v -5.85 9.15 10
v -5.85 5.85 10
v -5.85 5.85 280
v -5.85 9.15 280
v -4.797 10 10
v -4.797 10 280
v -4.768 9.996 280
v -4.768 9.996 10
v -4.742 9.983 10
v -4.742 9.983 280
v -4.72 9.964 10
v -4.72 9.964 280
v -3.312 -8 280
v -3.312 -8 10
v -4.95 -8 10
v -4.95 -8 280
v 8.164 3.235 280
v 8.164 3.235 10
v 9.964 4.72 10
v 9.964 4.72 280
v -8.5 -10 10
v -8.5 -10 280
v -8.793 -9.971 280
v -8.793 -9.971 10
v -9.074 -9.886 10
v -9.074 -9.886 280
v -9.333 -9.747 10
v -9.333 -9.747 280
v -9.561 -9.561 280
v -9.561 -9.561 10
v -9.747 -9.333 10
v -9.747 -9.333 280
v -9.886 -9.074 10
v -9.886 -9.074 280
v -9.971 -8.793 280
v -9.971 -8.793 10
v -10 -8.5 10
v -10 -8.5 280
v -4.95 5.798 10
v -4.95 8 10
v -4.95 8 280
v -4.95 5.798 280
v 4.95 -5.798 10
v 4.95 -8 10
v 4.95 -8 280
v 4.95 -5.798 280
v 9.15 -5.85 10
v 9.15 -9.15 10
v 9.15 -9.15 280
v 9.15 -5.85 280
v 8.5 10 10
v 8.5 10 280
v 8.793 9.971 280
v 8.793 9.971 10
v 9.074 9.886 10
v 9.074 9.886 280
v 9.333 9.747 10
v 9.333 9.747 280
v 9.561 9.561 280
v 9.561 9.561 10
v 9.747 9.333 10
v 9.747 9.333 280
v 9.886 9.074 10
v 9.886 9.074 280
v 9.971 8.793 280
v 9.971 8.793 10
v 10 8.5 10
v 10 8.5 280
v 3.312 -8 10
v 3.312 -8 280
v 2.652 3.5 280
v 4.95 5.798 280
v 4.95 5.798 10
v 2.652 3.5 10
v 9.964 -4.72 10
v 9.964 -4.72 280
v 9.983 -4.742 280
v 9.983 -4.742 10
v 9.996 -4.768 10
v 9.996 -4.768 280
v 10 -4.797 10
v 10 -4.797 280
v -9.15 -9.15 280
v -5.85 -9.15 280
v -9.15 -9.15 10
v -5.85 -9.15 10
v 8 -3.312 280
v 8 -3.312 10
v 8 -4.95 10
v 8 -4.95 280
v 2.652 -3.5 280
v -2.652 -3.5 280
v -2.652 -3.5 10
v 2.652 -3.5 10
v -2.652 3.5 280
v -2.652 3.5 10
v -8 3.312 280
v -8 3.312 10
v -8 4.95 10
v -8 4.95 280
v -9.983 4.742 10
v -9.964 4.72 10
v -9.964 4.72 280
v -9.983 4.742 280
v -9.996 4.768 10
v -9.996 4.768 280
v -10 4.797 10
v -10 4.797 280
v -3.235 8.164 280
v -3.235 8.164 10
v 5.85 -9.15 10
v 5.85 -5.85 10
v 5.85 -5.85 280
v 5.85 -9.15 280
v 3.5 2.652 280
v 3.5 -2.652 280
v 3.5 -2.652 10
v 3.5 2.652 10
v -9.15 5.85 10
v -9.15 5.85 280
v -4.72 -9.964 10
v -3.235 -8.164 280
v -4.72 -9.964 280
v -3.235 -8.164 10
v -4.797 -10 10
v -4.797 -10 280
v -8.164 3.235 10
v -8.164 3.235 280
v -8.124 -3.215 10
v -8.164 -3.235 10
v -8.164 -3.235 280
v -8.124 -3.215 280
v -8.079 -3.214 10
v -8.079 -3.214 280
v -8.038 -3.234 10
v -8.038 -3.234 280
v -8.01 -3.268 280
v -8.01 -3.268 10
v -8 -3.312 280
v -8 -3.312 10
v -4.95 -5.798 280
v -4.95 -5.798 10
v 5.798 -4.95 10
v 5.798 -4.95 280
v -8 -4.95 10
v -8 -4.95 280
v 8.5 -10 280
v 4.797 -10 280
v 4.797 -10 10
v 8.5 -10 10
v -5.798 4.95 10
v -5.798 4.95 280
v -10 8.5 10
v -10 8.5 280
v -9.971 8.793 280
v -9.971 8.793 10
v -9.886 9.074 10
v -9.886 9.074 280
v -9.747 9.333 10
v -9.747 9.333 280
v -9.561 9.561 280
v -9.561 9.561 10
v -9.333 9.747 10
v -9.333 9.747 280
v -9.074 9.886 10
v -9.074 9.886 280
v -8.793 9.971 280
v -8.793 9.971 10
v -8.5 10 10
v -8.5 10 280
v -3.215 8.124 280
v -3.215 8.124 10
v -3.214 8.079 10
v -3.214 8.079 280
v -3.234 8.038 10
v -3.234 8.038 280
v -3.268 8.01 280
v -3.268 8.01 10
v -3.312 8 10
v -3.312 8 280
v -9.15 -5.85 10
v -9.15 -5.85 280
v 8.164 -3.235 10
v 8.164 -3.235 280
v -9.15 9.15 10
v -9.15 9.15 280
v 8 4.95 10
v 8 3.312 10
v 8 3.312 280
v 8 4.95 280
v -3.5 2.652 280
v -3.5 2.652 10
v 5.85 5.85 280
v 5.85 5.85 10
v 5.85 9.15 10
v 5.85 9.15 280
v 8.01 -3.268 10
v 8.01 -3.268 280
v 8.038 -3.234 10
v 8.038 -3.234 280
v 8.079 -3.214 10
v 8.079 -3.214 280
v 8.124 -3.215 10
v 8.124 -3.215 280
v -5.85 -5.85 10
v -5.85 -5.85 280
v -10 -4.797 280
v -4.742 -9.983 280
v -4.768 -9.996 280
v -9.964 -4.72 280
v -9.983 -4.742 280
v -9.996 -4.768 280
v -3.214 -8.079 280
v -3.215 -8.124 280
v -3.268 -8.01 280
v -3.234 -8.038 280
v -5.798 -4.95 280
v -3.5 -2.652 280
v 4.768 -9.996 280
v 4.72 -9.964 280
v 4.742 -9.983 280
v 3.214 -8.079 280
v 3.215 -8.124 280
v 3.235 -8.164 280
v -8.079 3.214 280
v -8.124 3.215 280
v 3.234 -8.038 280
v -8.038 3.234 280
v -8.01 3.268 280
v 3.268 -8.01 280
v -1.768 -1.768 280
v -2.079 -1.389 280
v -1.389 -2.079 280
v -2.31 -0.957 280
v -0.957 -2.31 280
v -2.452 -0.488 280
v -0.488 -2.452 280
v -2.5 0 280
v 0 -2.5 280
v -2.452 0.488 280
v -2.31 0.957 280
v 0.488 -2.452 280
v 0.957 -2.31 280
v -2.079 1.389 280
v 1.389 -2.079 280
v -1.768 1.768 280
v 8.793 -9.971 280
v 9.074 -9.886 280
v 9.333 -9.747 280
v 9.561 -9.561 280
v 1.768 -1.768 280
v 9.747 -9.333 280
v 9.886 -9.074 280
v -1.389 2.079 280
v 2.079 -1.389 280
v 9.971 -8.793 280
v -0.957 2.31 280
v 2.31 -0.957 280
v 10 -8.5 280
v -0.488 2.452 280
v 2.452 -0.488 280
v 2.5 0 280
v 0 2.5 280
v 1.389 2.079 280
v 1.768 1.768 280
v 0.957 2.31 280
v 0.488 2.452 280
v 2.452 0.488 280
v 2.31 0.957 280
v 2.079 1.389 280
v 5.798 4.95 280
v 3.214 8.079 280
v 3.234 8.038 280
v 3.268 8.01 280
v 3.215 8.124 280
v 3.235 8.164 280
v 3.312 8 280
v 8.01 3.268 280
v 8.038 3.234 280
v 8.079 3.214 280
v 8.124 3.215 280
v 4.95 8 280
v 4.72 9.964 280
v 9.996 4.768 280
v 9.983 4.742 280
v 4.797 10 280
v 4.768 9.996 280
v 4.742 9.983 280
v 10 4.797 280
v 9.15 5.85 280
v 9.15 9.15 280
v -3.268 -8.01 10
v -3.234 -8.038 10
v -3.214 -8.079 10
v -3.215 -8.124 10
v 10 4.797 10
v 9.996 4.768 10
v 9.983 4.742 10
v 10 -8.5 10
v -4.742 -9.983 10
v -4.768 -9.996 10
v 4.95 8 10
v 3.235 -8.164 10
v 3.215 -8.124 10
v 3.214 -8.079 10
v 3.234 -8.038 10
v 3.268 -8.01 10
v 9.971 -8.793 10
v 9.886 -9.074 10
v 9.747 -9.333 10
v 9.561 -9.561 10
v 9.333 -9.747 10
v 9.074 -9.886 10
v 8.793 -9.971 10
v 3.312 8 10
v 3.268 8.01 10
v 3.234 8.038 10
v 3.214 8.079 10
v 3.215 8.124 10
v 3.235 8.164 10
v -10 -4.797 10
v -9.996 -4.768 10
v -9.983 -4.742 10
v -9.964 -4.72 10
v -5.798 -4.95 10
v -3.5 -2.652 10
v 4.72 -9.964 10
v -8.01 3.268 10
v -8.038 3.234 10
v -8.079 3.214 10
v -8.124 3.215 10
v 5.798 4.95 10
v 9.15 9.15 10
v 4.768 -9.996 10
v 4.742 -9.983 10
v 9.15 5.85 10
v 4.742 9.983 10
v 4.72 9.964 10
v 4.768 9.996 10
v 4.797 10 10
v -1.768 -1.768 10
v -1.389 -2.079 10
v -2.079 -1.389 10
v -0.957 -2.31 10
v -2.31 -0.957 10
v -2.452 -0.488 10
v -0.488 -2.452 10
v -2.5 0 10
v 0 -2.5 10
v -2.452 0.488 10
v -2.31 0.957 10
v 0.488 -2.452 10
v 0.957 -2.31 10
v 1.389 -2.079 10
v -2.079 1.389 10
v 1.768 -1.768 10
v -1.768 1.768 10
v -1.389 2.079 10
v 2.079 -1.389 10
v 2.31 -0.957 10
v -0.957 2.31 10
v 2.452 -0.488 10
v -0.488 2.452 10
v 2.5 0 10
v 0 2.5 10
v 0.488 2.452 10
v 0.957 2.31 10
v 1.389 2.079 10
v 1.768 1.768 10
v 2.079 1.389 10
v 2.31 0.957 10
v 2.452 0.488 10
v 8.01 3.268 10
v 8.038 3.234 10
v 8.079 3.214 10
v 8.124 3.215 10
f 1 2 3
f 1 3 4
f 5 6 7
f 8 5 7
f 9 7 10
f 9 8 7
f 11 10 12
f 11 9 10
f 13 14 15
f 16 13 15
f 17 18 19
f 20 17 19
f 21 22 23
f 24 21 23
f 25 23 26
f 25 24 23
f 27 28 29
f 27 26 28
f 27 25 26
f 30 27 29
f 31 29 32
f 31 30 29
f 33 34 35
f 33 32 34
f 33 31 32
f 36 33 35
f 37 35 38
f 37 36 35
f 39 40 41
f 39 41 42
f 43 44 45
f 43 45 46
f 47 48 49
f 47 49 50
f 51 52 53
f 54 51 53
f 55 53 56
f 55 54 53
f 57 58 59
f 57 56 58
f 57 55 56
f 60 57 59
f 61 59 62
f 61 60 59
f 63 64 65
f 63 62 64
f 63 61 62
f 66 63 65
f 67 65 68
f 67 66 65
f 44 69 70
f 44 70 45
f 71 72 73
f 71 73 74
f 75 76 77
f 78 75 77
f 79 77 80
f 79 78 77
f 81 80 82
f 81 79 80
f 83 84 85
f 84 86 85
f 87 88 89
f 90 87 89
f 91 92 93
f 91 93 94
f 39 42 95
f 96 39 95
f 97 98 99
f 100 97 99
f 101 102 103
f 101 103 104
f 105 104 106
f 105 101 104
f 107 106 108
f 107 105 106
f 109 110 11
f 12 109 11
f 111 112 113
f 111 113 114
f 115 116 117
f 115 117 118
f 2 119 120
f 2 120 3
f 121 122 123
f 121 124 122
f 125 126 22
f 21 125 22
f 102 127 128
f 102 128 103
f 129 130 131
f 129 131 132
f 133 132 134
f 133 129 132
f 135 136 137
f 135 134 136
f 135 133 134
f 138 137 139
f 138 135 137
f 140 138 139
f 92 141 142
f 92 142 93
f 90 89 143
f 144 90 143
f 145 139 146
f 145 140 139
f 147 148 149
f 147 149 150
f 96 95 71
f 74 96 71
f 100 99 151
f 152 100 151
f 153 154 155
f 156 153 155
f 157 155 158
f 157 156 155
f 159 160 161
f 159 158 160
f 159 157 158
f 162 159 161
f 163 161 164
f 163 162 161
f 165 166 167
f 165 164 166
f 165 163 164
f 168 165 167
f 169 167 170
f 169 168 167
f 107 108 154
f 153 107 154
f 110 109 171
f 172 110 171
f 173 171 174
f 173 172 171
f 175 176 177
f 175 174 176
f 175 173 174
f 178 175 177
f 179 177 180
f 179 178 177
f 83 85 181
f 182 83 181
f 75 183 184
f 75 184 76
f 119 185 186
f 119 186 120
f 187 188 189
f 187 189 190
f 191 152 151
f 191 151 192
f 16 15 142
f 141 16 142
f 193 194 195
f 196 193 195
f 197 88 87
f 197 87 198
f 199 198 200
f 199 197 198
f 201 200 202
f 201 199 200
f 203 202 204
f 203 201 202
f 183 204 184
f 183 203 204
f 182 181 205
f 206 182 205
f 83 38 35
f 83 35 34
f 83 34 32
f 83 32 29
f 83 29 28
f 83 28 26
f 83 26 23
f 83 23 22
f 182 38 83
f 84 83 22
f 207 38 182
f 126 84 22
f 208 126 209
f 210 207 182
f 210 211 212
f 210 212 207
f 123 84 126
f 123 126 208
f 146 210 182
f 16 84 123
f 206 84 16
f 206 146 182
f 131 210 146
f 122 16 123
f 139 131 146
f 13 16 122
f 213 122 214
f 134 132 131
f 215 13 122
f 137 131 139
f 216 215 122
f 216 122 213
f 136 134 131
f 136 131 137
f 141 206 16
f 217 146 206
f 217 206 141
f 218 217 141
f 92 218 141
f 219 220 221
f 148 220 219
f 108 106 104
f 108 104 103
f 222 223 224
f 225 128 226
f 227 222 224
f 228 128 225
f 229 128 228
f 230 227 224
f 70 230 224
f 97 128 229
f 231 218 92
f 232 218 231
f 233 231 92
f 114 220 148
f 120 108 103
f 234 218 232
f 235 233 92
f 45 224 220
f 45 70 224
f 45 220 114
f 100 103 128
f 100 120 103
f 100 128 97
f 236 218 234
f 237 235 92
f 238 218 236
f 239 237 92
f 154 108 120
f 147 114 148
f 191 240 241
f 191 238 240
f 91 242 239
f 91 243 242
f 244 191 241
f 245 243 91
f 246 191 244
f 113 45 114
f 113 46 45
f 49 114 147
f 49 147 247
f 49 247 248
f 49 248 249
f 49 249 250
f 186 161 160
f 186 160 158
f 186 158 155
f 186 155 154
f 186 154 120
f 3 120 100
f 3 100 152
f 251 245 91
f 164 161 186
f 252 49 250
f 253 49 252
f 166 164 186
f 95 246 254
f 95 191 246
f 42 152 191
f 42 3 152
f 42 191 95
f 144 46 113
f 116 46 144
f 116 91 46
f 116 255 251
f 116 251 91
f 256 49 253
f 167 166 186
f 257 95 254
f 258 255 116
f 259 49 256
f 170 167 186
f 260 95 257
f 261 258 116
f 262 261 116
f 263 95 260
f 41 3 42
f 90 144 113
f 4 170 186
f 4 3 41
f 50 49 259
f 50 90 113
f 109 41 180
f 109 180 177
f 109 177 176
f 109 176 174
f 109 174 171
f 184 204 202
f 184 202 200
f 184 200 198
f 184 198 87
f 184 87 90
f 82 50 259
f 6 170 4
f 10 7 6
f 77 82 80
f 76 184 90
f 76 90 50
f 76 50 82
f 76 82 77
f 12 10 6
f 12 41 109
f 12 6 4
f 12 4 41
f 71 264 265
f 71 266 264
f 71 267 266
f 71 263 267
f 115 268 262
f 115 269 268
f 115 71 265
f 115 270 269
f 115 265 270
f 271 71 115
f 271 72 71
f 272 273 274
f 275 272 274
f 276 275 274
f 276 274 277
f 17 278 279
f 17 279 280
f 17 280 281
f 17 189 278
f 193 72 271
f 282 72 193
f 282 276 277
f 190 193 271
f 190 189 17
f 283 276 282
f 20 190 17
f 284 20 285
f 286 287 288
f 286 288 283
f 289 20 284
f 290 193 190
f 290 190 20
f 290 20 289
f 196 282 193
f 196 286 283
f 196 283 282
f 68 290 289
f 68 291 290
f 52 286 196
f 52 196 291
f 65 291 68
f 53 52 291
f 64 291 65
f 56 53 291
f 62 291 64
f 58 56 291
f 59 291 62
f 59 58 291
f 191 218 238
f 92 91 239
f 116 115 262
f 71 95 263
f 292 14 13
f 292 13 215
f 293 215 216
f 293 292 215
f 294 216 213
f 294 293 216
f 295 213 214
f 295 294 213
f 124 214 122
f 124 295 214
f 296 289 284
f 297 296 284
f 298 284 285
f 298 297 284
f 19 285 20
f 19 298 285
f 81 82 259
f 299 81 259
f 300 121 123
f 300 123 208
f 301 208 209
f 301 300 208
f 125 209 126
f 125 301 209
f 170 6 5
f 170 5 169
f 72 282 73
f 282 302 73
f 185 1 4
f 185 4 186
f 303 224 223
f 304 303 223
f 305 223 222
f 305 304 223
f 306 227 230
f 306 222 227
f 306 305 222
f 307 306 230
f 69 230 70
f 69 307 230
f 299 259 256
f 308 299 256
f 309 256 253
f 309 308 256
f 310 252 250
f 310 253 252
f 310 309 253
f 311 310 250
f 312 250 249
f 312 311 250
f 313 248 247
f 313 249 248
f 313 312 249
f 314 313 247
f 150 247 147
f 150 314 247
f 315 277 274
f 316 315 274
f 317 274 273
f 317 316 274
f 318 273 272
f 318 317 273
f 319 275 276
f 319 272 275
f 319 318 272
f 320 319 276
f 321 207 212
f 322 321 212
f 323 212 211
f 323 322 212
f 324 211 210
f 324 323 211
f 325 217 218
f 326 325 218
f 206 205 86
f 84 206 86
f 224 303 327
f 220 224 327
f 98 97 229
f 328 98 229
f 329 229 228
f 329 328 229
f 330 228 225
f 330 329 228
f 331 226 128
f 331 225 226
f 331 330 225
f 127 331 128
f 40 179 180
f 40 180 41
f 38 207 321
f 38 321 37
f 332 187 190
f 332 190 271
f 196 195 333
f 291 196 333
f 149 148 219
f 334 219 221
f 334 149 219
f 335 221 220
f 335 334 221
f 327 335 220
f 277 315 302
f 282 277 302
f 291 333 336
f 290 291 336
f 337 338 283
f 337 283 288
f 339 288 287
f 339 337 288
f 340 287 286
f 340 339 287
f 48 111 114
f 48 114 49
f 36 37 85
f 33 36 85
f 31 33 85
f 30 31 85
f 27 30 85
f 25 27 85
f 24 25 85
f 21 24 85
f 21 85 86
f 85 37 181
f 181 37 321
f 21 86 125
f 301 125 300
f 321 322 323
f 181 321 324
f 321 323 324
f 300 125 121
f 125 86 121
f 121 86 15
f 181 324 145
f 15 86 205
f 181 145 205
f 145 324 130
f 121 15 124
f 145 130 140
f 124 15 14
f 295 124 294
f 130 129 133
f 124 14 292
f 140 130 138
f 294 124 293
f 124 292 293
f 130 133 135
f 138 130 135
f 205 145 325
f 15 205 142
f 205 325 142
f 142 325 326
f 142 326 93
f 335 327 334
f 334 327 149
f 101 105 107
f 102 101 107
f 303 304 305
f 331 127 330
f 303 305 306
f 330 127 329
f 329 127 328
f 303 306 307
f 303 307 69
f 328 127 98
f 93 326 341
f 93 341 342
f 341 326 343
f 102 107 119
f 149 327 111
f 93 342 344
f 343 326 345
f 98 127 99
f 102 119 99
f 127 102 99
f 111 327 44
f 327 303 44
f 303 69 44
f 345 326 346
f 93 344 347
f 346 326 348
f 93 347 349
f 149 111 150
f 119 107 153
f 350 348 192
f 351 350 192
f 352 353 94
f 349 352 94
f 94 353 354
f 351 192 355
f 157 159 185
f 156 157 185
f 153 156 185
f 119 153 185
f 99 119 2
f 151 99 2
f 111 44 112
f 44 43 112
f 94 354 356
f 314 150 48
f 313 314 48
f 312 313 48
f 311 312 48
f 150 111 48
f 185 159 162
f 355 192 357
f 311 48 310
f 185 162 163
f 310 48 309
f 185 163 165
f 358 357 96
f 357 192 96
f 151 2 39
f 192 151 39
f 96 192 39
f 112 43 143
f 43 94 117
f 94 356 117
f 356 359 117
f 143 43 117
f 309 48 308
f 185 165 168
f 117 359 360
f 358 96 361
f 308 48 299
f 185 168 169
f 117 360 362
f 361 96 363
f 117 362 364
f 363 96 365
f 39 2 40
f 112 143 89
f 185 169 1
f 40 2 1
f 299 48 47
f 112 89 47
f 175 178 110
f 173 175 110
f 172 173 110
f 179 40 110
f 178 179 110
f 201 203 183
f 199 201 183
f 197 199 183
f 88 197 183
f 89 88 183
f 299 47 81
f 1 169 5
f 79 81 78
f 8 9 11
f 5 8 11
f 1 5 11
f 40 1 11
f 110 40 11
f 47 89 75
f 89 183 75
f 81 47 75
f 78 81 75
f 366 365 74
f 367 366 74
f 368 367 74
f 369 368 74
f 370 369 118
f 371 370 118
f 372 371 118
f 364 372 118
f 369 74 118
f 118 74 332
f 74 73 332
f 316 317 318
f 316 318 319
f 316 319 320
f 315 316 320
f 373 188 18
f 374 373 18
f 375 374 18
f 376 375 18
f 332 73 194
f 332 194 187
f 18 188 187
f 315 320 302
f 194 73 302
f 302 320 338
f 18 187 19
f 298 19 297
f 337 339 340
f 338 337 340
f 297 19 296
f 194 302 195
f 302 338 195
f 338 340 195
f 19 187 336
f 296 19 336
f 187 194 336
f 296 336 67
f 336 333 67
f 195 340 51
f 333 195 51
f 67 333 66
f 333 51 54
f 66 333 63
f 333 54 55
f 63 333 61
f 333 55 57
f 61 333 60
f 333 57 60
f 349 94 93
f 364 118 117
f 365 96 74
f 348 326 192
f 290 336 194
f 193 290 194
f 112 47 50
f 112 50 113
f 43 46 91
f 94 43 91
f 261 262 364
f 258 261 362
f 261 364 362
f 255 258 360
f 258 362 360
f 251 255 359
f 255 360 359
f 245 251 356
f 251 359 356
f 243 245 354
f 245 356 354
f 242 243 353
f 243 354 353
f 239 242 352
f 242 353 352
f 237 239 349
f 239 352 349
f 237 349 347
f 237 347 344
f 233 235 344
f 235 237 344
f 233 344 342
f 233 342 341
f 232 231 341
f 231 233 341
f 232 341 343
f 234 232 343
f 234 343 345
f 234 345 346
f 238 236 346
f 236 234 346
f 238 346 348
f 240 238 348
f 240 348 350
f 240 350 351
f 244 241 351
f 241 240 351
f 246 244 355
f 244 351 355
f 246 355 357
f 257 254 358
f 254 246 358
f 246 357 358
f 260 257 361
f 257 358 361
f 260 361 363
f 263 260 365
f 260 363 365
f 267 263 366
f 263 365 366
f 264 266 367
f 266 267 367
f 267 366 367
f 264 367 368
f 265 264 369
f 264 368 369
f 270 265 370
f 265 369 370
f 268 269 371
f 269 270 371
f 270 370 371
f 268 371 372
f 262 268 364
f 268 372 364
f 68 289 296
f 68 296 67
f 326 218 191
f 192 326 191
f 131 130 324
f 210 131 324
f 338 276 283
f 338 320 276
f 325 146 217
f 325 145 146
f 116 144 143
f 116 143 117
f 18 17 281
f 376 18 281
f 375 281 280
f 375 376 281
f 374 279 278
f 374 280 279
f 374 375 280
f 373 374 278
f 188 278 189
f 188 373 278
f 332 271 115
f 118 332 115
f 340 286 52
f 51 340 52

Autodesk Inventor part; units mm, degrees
ref_plane "Начальная плоскость" through (0, 0, 10) normal (0, 0, 1) x (1, 0, 0)
ref_plane "Конечная плоскость" through (0, 0, 280) normal (0, 0, 1) x (1, 0, 0)
sketch "Эскиз" plane through (0, 0, 0) normal (0, 0, 1) x (1, 0, 0)
  line L0 (-14.4349, 0) -> (14.4349, 0) projected
  line L1 (0, -14) -> (0, 14) projected
  line L2 (0, 0) -> (7.5, 7.5) construction
  circle A0 centre (7.5, 7.5) radius 1.65 construction
  line L3 (5.85, 9.15) -> (9.15, 9.15)
  line L4 (9.15, 9.15) -> (9.15, 5.85)
  line L5 (9.15, 5.85) -> (5.85, 5.85)
  line L6 (5.85, 5.85) -> (5.85, 9.15)
  line L7 (3.235, 8.1636) -> (4.72, 9.9636)
  line L8 (4.7971, 10) -> (8.5, 10)
  line L9 (3.3121, 8) -> (4.95, 8)
  line L10 (4.95, 8) -> (4.95, 5.7985)
  line L11 (4.95, 5.7985) -> (2.6515, 3.5)
  line L12 (0, 3.5) -> (2.6515, 3.5)
  circle A1 centre (0, 0) radius 2.5
  line L13 (8.1636, 3.235) -> (9.9636, 4.72)
  line L14 (10, 4.7971) -> (10, 8.5)
  line L15 (8, 3.3121) -> (8, 4.95)
  line L16 (8, 4.95) -> (5.7985, 4.95)
  line L17 (5.7985, 4.95) -> (3.5, 2.6515)
  line L18 (3.5, 0) -> (3.5, 2.6515)
  arc A2 (10, 8.5) -> (8.5, 10) centre (8.5, 8.5) ccw
  line L19 (0, 0) -> (-7.5, 7.5) construction
  circle A3 centre (-7.5, 7.5) radius 1.65 construction
  line L20 (-5.85, 9.15) -> (-9.15, 9.15)
  line L21 (-9.15, 9.15) -> (-9.15, 5.85)
  line L22 (-9.15, 5.85) -> (-5.85, 5.85)
  line L23 (-5.85, 5.85) -> (-5.85, 9.15)
  line L24 (-3.235, 8.1636) -> (-4.72, 9.9636)
  line L25 (-4.7971, 10) -> (-8.5, 10)
  line L26 (-3.3121, 8) -> (-4.95, 8)
  line L27 (-4.95, 8) -> (-4.95, 5.7985)
  line L28 (-4.95, 5.7985) -> (-2.6515, 3.5)
  line L29 (0, 3.5) -> (-2.6515, 3.5)
  line L30 (-3.5, 0) -> (-3.5, 2.6515)
  line L31 (-5.7985, 4.95) -> (-3.5, 2.6515)
  line L32 (-8, 4.95) -> (-5.7985, 4.95)
  line L33 (-8, 3.3121) -> (-8, 4.95)
  line L34 (-8.1636, 3.235) -> (-9.9636, 4.72)
  line L35 (-10, 4.7971) -> (-10, 8.5)
  arc A4 (-8.5, 10) -> (-10, 8.5) centre (-8.5, 8.5) ccw
  line L36 (0, 14) -> (0, -14)
  line L37 (0, 0) -> (7.5, -7.5) construction
  circle A5 centre (7.5, -7.5) radius 1.65 construction
  line L38 (5.85, -9.15) -> (9.15, -9.15)
  line L39 (9.15, -9.15) -> (9.15, -5.85)
  line L40 (9.15, -5.85) -> (5.85, -5.85)
  line L41 (5.85, -5.85) -> (5.85, -9.15)
  line L42 (3.235, -8.1636) -> (4.72, -9.9636)
  line L43 (4.7971, -10) -> (8.5, -10)
  line L44 (3.3121, -8) -> (4.95, -8)
  line L45 (4.95, -8) -> (4.95, -5.7985)
  line L46 (4.95, -5.7985) -> (2.6515, -3.5)
  line L47 (0, -3.5) -> (2.6515, -3.5)
  line L48 (3.5, 0) -> (3.5, -2.6515)
  line L49 (5.7985, -4.95) -> (3.5, -2.6515)
  line L50 (8, -4.95) -> (5.7985, -4.95)
  line L51 (8, -3.3121) -> (8, -4.95)
  line L52 (8.1636, -3.235) -> (9.9636, -4.72)
  line L53 (10, -4.7971) -> (10, -8.5)
  arc A6 (8.5, -10) -> (10, -8.5) centre (8.5, -8.5) ccw
  line L54 (0, 0) -> (-7.5, -7.5) construction
  line L55 (-4.95, -8) -> (-4.95, -5.7985)
  line L56 (-3.3121, -8) -> (-4.95, -8)
  line L57 (-5.7985, -4.95) -> (-3.5, -2.6515)
  line L58 (-4.95, -5.7985) -> (-2.6515, -3.5)
  line L59 (-3.5, 0) -> (-3.5, -2.6515)
  line L60 (0, -3.5) -> (-2.6515, -3.5)
  circle A7 centre (-7.5, -7.5) radius 1.65 construction
  line L61 (-5.85, -5.85) -> (-5.85, -9.15)
  line L62 (-5.85, -9.15) -> (-9.15, -9.15)
  line L63 (-9.15, -9.15) -> (-9.15, -5.85)
  line L64 (-9.15, -5.85) -> (-5.85, -5.85)
  line L65 (-3.235, -8.1636) -> (-4.72, -9.9636)
  line L66 (-8, -4.95) -> (-5.7985, -4.95)
  line L67 (-8, -3.3121) -> (-8, -4.95)
  line L68 (-8.1636, -3.235) -> (-9.9636, -4.72)
  line L69 (-4.7971, -10) -> (-8.5, -10)
  line L70 (-10, -4.7971) -> (-10, -8.5)
  arc A8 (-10, -8.5) -> (-8.5, -10) centre (-8.5, -8.5) ccw
  arc A9 (3.235, 8.1636) -> (3.3121, 8) centre (3.3121, 8.1) ccw
  arc A10 (4.7971, 10) -> (4.72, 9.9636) centre (4.7971, 9.9) ccw
  arc A11 (8, 3.3121) -> (8.1636, 3.235) centre (8.1, 3.3121) ccw
  arc A12 (9.9636, 4.72) -> (10, 4.7971) centre (9.9, 4.7971) ccw
  arc A13 (-3.3121, 8) -> (-3.235, 8.1636) centre (-3.3121, 8.1) ccw
  arc A14 (-4.72, 9.9636) -> (-4.7971, 10) centre (-4.7971, 9.9) ccw
  arc A15 (-8.1636, 3.235) -> (-8, 3.3121) centre (-8.1, 3.3121) ccw
  arc A16 (-10, 4.7971) -> (-9.9636, 4.72) centre (-9.9, 4.7971) ccw
  arc A17 (-8, -3.3121) -> (-8.1636, -3.235) centre (-8.1, -3.3121) ccw
  arc A18 (-9.9636, -4.72) -> (-10, -4.7971) centre (-9.9, -4.7971) ccw
  arc A19 (-3.235, -8.1636) -> (-3.3121, -8) centre (-3.3121, -8.1) ccw
  arc A20 (-4.7971, -10) -> (-4.72, -9.9636) centre (-4.7971, -9.9) ccw
  arc A21 (4.72, -9.9636) -> (4.7971, -10) centre (4.7971, -9.9) ccw
  arc A22 (3.3121, -8) -> (3.235, -8.1636) centre (3.3121, -8.1) ccw
  arc A23 (8.1636, -3.235) -> (8, -3.3121) centre (8.1, -3.3121) ccw
  arc A24 (10, -4.7971) -> (9.9636, -4.72) centre (9.9, -4.7971) ccw
  point P0 (3.1, 8)
  point P1 (4.75, 10)
  point P2 (7.5, 9.15)
  point P3 (8, 3.1)
  point P4 (10, 4.75)
  point P5 (7.5, 5.85)
  point P6 (9.15, 7.5)
  point P7 (-3.1, 8)
  point P8 (-4.75, 10)
  point P9 (-7.5, 9.15)
  point P10 (-8, 3.1)
  point P11 (-10, 4.75)
  point P12 (-7.5, 5.85)
  point P13 (-9.15, 7.5)
  point P14 (3.1, -8)
  point P15 (4.75, -10)
  point P16 (7.5, -9.15)
  point P17 (8, -3.1)
  point P18 (10, -4.75)
  point P19 (7.5, -5.85)
  point P20 (9.15, -7.5)
  point P21 (-3.1, -8)
  point P22 (-7.5, -5.85)
  point P23 (-7.5, -9.15)
  point P24 (-9.15, -7.5)
  point P25 (-4.75, -10)
  point P26 (-8, -3.1)
  point P27 (-10, -4.75)
  dimension "d0" = 45
  dimension "d1" = 3.3
  dimension "d2" = 1.5
  dimension "d3" = 1.2
  dimension "d4" = 5
  dimension "d5" = 6.5
  dimension "d6" = 15
  dimension "d7" = 20
  dimension "d8" = 9.9
  dimension "d9" = 9.5
  dimension "d10" = 6.2
  dimension "d11" = 2
  dimension "d18" = 0.1
  dimension "d19" = 0.1
extrude "Тело" add sketch "Эскиз" along normal up to surface (270 mm away) from surface at 10 contours A1 L1 L12 L11 L10 L9 A9 L7 A10 L8 A2 L14 A12 L13 A11 L15 L16 L17 L18 L0 | L0 L48 L49 L50 L51 A23 L52 A24 L53 A6 L43 A21 L42 A22 L44 L45 L46 L47 L1 A1 | A1 L0 L30 L31 L32 L33 A15 L34 A16 L35 A4 L25 A14 L24 A13 L26 L27 L28 L29 L1 | L1 L60 L58 L55 L56 A19 L65 A20 L69 A8 L70 A18 L68 A17 L67 L66 L57 L59 L0 A1
sketch "Эскиз2" plane through (0, 0, 0) normal (0, 0, 1) x (1, 0, 0)
  line L0 (0, 0) -> (10, 0)
ref_plane "РабПлоскость3" through (0, 0, 0) normal (0, -1, 0) x (1, 0, 0)
sketch "Эскиз3" plane through (0, 0, 0) normal (0, -1, 0) x (1, 0, 0)
  line L0 (-2, 10) -> (12, 10)
  line L1 (-2, 280) -> (12, 280)
  dimension "d25" = 270
ref_plane "РабПлоскость4" through (300, -4.7971, 280) normal (0, 0, 1) x (1, 0, 0)
split "Разделение1" plane through (300, -4.7971, 280) removes the side toward (0, 0, 1)
ref_plane "РабПлоскость5" through (300, -8.5, 10) normal (0, 0, -1) x (-1, 0, 0)
split "Разделение2" plane through (300, -8.5, 10) removes the side toward (0, 0, -1)
properties part number "короткая палка"
